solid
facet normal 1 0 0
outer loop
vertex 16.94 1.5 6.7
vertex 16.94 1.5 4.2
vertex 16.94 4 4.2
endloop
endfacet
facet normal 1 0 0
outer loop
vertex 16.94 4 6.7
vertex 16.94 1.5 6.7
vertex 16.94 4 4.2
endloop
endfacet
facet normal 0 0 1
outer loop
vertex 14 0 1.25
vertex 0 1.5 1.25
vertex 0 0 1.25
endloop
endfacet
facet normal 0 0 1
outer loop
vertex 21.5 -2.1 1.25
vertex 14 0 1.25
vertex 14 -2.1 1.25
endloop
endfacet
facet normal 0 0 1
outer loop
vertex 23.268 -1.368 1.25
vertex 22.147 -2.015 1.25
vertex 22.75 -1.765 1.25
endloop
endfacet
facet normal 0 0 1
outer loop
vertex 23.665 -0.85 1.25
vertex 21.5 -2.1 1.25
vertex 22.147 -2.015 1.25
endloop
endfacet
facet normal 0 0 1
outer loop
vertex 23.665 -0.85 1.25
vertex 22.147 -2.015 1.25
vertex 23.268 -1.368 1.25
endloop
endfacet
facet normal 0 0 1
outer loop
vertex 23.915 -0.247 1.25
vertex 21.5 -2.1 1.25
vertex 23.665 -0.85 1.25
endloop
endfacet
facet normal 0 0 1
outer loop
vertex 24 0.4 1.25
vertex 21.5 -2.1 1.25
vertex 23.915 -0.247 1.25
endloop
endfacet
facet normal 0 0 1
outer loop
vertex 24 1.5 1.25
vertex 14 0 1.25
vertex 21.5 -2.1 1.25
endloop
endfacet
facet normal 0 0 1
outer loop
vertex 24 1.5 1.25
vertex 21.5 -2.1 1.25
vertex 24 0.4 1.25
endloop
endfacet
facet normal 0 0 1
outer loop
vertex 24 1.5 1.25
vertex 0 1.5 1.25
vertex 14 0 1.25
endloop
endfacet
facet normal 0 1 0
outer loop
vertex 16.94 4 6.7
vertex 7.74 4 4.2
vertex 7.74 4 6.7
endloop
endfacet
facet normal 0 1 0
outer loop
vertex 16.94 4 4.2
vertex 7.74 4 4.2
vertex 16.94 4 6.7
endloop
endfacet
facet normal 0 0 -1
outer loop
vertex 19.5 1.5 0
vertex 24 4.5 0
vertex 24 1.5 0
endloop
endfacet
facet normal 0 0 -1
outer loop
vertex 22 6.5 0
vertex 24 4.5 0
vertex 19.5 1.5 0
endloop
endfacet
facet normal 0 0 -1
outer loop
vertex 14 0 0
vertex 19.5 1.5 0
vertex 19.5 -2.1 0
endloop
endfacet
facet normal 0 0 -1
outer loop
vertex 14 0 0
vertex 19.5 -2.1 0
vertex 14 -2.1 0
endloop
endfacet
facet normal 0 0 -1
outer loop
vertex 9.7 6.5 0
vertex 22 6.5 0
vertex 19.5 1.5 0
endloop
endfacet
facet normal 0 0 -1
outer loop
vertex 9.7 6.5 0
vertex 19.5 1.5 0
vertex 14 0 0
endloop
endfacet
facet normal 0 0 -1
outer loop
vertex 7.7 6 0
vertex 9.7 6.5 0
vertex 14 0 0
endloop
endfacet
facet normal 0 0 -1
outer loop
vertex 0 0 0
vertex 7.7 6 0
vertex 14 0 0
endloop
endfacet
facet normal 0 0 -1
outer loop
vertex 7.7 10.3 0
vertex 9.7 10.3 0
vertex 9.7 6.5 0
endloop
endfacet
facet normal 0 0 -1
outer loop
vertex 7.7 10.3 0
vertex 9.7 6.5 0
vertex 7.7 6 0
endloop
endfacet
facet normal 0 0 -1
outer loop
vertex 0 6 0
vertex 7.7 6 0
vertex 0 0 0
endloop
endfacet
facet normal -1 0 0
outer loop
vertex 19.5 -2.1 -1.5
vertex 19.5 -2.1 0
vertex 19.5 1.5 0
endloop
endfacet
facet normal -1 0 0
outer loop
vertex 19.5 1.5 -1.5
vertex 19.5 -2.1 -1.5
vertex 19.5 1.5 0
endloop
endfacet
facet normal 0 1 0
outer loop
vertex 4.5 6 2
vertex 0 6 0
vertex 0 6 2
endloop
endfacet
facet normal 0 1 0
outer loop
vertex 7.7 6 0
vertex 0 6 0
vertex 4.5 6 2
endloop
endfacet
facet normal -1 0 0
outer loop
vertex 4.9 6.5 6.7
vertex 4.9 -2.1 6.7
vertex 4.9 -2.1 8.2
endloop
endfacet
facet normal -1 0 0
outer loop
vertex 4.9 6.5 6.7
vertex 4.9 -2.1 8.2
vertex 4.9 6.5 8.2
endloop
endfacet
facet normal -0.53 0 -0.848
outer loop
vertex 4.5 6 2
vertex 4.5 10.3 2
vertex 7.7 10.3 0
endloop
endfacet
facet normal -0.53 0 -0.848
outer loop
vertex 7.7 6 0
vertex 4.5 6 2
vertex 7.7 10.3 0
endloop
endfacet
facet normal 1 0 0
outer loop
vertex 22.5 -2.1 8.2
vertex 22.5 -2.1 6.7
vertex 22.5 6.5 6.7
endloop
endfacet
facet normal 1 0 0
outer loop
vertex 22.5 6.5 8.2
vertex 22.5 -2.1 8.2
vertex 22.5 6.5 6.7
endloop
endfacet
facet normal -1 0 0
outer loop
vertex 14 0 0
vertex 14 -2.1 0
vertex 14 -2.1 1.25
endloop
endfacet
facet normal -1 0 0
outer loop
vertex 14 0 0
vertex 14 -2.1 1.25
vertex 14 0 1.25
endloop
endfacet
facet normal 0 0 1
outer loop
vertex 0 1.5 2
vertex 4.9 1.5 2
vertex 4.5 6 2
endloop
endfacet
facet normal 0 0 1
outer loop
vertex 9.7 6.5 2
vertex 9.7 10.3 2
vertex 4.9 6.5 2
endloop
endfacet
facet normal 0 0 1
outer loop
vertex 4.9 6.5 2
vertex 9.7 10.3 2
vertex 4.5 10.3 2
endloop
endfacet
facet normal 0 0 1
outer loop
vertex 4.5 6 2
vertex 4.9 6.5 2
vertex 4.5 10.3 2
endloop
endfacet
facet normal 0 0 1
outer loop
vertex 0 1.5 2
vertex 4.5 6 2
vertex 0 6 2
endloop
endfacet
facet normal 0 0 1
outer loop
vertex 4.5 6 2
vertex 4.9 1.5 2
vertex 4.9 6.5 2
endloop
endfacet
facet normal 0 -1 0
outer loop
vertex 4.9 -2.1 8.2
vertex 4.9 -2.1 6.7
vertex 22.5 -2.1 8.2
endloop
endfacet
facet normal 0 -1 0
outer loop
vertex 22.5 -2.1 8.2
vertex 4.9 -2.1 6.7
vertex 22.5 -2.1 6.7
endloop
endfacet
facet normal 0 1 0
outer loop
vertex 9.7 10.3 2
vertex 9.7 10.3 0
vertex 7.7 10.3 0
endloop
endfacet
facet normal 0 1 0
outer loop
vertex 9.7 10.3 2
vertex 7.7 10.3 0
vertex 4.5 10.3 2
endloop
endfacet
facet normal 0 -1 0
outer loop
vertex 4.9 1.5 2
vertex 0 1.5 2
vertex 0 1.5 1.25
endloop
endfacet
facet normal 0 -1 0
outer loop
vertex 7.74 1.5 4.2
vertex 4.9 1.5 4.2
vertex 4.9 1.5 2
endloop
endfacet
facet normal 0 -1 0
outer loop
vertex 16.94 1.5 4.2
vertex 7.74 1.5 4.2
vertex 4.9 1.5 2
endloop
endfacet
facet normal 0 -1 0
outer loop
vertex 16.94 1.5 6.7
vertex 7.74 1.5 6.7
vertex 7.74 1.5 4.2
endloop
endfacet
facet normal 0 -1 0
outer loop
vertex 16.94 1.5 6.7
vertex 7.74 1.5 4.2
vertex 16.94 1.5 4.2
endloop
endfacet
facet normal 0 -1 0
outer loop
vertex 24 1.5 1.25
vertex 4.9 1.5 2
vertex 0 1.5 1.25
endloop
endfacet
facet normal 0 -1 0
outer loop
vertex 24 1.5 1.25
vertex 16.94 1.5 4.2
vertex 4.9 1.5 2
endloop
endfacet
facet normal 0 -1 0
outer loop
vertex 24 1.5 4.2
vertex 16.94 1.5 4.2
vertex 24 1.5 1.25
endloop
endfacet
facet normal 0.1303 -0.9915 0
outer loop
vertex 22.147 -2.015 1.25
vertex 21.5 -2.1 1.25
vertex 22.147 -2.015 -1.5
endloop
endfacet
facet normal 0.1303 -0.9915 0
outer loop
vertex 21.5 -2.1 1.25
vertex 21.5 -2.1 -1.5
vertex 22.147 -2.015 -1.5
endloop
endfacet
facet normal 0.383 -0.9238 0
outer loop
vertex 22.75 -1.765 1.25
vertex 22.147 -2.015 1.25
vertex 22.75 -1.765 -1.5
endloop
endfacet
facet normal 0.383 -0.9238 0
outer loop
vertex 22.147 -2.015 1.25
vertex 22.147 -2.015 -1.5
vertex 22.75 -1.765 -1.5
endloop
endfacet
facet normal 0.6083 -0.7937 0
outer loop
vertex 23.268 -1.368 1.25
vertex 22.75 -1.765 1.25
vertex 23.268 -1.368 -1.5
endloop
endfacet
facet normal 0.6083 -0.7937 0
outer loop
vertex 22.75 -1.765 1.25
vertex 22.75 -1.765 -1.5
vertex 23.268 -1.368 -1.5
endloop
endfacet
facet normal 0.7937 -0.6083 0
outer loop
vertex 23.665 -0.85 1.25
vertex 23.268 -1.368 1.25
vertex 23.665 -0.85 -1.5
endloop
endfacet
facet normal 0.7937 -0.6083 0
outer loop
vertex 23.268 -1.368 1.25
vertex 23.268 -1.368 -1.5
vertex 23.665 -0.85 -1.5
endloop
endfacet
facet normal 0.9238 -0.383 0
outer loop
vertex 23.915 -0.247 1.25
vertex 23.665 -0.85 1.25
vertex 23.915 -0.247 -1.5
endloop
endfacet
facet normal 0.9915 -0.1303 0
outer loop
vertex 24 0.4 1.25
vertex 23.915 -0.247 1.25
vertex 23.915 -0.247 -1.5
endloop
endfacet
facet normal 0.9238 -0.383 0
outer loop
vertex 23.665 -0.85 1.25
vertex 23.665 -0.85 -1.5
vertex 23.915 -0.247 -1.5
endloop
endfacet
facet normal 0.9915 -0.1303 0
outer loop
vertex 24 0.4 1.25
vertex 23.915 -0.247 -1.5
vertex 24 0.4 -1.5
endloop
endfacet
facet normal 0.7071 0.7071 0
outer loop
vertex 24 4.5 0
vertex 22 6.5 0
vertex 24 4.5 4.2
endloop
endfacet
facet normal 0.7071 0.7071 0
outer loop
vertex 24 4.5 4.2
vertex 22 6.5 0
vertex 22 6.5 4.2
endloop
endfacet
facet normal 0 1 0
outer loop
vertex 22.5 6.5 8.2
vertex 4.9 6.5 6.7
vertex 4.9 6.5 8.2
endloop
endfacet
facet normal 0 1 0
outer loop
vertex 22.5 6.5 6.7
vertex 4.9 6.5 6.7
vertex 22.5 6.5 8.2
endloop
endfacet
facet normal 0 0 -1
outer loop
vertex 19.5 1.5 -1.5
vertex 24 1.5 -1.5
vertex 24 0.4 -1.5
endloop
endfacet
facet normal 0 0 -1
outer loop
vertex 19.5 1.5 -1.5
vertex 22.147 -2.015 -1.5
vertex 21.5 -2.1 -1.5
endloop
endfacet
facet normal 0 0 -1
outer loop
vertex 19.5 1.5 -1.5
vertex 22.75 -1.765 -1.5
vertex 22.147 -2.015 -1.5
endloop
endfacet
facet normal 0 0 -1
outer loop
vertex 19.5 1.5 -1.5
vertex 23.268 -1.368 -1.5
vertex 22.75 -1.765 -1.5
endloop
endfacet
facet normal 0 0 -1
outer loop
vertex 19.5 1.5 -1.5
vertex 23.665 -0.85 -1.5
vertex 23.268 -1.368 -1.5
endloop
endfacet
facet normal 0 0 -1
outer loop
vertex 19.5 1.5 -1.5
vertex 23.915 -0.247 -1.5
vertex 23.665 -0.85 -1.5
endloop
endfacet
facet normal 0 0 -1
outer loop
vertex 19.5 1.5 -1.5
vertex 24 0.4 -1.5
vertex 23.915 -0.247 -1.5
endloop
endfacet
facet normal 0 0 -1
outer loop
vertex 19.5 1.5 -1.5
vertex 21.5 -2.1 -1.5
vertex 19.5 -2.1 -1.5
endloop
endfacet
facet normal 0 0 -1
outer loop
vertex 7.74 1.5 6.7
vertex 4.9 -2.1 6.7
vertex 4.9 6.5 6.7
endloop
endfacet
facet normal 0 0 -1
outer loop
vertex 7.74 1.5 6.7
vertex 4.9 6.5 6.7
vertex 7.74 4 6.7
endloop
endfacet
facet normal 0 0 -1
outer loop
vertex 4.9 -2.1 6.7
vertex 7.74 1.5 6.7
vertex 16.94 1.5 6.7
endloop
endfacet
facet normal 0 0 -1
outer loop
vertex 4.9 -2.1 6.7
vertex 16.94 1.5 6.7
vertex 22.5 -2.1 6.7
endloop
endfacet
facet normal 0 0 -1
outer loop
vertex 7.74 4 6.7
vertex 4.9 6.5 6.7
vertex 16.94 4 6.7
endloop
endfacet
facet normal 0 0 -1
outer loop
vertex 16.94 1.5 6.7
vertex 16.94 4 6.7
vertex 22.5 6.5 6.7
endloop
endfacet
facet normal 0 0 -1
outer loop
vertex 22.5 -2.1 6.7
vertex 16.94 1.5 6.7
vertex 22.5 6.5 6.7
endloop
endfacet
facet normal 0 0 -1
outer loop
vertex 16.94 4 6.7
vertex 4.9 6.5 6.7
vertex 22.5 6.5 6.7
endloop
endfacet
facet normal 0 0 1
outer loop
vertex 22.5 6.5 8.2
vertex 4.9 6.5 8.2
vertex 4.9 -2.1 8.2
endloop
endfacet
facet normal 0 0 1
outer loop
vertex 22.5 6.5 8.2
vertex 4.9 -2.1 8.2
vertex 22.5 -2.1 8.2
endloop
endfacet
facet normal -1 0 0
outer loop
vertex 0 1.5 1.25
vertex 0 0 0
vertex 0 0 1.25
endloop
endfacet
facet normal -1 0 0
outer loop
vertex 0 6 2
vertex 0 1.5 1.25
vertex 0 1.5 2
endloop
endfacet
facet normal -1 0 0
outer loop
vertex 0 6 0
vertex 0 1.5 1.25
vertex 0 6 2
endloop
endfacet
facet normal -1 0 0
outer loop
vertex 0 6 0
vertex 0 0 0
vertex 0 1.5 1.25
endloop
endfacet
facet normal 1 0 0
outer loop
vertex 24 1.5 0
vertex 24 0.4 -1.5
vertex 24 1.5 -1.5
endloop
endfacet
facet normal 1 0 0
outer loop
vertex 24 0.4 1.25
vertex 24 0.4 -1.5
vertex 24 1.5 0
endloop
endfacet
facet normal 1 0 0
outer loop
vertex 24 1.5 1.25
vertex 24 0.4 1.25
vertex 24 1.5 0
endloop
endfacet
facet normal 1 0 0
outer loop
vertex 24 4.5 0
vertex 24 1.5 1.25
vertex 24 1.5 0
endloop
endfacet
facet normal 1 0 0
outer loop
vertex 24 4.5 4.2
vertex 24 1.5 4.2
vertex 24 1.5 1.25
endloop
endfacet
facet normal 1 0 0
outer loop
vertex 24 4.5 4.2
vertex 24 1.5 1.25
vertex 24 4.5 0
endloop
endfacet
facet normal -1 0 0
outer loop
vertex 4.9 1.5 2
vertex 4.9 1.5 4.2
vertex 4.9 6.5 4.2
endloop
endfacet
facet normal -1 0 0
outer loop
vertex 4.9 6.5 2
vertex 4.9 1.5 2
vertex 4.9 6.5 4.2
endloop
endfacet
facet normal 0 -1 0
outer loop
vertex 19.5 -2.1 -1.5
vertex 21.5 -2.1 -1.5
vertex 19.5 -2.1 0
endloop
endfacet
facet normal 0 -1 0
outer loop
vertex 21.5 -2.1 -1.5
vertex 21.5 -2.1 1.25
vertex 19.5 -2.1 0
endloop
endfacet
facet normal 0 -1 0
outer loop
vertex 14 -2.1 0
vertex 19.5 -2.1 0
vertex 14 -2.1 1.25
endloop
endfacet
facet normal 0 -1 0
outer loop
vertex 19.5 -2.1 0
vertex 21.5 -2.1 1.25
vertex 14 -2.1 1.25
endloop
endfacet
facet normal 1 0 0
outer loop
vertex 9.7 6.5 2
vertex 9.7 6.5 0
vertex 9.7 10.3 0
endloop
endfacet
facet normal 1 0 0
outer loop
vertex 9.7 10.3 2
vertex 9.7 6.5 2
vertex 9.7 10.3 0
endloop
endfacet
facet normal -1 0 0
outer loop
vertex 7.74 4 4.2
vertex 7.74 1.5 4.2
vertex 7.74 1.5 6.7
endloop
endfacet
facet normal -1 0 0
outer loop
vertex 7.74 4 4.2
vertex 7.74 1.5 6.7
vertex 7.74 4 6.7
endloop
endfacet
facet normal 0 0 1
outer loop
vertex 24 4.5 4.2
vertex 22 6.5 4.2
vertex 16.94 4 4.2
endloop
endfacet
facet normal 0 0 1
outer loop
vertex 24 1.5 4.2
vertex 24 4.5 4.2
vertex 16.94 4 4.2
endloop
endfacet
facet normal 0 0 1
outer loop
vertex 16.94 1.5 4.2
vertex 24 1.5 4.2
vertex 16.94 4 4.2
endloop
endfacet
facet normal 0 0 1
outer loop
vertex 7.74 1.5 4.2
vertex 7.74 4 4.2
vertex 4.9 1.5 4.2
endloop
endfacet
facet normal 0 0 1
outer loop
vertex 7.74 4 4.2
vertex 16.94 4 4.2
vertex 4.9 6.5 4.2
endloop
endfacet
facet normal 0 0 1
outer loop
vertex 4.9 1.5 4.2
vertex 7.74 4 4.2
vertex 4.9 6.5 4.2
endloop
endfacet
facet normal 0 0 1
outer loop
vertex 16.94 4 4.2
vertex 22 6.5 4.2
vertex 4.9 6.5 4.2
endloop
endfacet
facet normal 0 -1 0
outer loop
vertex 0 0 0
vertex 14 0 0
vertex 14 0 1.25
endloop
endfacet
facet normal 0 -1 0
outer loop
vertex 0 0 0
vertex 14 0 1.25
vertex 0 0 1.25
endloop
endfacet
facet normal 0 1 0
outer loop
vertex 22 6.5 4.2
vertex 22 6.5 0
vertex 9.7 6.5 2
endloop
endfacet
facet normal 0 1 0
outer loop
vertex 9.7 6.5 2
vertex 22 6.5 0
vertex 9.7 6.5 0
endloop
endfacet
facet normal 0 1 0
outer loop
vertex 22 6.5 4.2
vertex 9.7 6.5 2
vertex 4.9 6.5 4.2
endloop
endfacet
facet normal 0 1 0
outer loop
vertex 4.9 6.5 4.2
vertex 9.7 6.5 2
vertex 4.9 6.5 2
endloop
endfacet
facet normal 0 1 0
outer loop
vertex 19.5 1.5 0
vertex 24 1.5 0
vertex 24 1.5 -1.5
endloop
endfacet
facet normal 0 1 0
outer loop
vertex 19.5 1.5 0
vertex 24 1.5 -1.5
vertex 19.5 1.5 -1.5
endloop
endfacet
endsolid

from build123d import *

# Parameters (mm, degrees)
SKETCH_1_W          = 4.5
SKETCH_1_H          = 6
EXTRUDE_1_DEPTH     = 2
SKETCH_2_W          = 19.5
SKETCH_2_H          = 6.5
EXTRUDE_2_DEPTH     = 4.2
SKETCH_4_W          = 10
SKETCH_4_H          = 2.1
EXTRUDE_3_DEPTH     = 4.2
SKETCH_5_W          = 24
SKETCH_5_H          = 3.6
CUT_EXTRUDE_1_DEPTH = 2.95
SKETCH_3_W          = 4.5
SKETCH_3_H          = 3.6
EXTRUDE_4_DEPTH     = 1.5
SKETCH_7_W          = 5.2
SKETCH_7_H          = 3.8
EXTRUDE_5_DEPTH     = 2
CUT_EXTRUDE_2_REACH = 29.339
SKETCH_9_W          = 0.4
SKETCH_9_H          = 5
CUT_EXTRUDE_3_DEPTH = 2.2
FILLET_1_R          = 2.5
CHAMFER_1_SIZE      = 2
SKETCH_10_W         = 9.2
SKETCH_10_H         = 2.5
EXTRUDE_6_DEPTH     = 2.5
SKETCH_11_W         = 17.6
SKETCH_11_H         = 8.6
EXTRUDE_7_DEPTH     = 1.5


with BuildPart() as part:
    # 草图1 → 凸台-拉伸1 (new body)
    with BuildSketch(Plane.XY):
        with Locations((2.25, 3)):
            Rectangle(SKETCH_1_W, SKETCH_1_H)
    extrude(amount=EXTRUDE_1_DEPTH)

    # 草图2 → 凸台-拉伸2 (add)
    with BuildSketch(Plane(origin=(0, 0, 0), x_dir=(-1, 0, 0), z_dir=(0, 0, -1))):
        with Locations((-14.25, 3.25)):
            Rectangle(SKETCH_2_W, SKETCH_2_H)
    extrude(amount=-EXTRUDE_2_DEPTH)

    # 草图4 → 凸台-拉伸3 (add)
    with BuildSketch(Plane(origin=(0, 0, 0), x_dir=(-1, 0, 0), z_dir=(0, 0, -1))):
        with Locations((-19, -1.05)):
            Rectangle(SKETCH_4_W, SKETCH_4_H)
    extrude(amount=-EXTRUDE_3_DEPTH)

    # 草图5 → 切除-拉伸1 (cut)
    with BuildSketch(Plane.XY.offset(4.2)):
        with Locations((12, -0.3)):
            Rectangle(SKETCH_5_W, SKETCH_5_H)
    extrude(amount=-CUT_EXTRUDE_1_DEPTH, mode=Mode.SUBTRACT)

    # 草图3 → 凸台-拉伸4 (add)
    with BuildSketch(Plane(origin=(0, 0, 0), x_dir=(-1, 0, 0), z_dir=(0, 0, -1))):
        with Locations((-21.75, -0.3)):
            Rectangle(SKETCH_3_W, SKETCH_3_H)
    extrude(amount=EXTRUDE_4_DEPTH)

    # 草图7 → 凸台-拉伸5 (add)
    with BuildSketch(Plane(origin=(0, 0, 0), x_dir=(-1, 0, 0), z_dir=(0, 0, -1))):
        with Locations((-7.1, 8.4)):
            Rectangle(SKETCH_7_W, SKETCH_7_H)
    extrude(amount=-EXTRUDE_5_DEPTH)

    # 切除-拉伸2: up to this face of the body (flat: up to its plane)
    cut_extrude_2_end = Plane(part.part.faces().sort_by_distance((2.25, 6, 1))[0])
    # 草图8 → 切除-拉伸2 (cut, up to the picked face)
    with BuildSketch(Plane(origin=(0, 10.3, 0), x_dir=(1, 0, 0), z_dir=(0, 1, 0)), mode=Mode.PRIVATE) as cut_extrude_2_sk1:
        Polygon((4.5, -2), (7.7, 0), (4.5, 0), align=None)
    cut_extrude_2_tool1 = split(extrude(cut_extrude_2_sk1.sketch, amount=-CUT_EXTRUDE_2_REACH, mode=Mode.PRIVATE), bisect_by=cut_extrude_2_end, keep=Keep.BOTH, mode=Mode.PRIVATE)
    add(cut_extrude_2_tool1.solids().sort_by(Axis((5.566667, 10.3, 0.666667), (0, -1, 0)))[0], mode=Mode.SUBTRACT)

    # 草图9 → 切除-拉伸3 (cut)
    with BuildSketch(Plane.XY.offset(4.2)):
        with Locations((4.7, 4)):
            Rectangle(SKETCH_9_W, SKETCH_9_H)
    extrude(amount=-CUT_EXTRUDE_3_DEPTH, mode=Mode.SUBTRACT)

    # 圆角1
    fillet_1_edges = [part.edges().sort_by_distance(p)[0] for p in [
        (24, -2.1, -0.125),
    ]]
    fillet(fillet_1_edges, radius=FILLET_1_R)

    # 倒角1
    chamfer_1_edges = [part.edges().sort_by_distance(p)[0] for p in [
        (24, 6.5, 2.1),
    ]]
    chamfer(chamfer_1_edges, length=CHAMFER_1_SIZE)

    # 草图10 → 凸台-拉伸6 (add)
    with BuildSketch(Plane.XY.offset(4.2)):
        with Locations((12.34, 2.75)):
            Rectangle(SKETCH_10_W, SKETCH_10_H)
    extrude(amount=EXTRUDE_6_DEPTH)

    # 草图11 → 凸台-拉伸7 (add)
    with BuildSketch(Plane.XY.offset(6.7)):
        with Locations((13.7, 2.2)):
            Rectangle(SKETCH_11_W, SKETCH_11_H)
    extrude(amount=EXTRUDE_7_DEPTH)


solid = part.part
